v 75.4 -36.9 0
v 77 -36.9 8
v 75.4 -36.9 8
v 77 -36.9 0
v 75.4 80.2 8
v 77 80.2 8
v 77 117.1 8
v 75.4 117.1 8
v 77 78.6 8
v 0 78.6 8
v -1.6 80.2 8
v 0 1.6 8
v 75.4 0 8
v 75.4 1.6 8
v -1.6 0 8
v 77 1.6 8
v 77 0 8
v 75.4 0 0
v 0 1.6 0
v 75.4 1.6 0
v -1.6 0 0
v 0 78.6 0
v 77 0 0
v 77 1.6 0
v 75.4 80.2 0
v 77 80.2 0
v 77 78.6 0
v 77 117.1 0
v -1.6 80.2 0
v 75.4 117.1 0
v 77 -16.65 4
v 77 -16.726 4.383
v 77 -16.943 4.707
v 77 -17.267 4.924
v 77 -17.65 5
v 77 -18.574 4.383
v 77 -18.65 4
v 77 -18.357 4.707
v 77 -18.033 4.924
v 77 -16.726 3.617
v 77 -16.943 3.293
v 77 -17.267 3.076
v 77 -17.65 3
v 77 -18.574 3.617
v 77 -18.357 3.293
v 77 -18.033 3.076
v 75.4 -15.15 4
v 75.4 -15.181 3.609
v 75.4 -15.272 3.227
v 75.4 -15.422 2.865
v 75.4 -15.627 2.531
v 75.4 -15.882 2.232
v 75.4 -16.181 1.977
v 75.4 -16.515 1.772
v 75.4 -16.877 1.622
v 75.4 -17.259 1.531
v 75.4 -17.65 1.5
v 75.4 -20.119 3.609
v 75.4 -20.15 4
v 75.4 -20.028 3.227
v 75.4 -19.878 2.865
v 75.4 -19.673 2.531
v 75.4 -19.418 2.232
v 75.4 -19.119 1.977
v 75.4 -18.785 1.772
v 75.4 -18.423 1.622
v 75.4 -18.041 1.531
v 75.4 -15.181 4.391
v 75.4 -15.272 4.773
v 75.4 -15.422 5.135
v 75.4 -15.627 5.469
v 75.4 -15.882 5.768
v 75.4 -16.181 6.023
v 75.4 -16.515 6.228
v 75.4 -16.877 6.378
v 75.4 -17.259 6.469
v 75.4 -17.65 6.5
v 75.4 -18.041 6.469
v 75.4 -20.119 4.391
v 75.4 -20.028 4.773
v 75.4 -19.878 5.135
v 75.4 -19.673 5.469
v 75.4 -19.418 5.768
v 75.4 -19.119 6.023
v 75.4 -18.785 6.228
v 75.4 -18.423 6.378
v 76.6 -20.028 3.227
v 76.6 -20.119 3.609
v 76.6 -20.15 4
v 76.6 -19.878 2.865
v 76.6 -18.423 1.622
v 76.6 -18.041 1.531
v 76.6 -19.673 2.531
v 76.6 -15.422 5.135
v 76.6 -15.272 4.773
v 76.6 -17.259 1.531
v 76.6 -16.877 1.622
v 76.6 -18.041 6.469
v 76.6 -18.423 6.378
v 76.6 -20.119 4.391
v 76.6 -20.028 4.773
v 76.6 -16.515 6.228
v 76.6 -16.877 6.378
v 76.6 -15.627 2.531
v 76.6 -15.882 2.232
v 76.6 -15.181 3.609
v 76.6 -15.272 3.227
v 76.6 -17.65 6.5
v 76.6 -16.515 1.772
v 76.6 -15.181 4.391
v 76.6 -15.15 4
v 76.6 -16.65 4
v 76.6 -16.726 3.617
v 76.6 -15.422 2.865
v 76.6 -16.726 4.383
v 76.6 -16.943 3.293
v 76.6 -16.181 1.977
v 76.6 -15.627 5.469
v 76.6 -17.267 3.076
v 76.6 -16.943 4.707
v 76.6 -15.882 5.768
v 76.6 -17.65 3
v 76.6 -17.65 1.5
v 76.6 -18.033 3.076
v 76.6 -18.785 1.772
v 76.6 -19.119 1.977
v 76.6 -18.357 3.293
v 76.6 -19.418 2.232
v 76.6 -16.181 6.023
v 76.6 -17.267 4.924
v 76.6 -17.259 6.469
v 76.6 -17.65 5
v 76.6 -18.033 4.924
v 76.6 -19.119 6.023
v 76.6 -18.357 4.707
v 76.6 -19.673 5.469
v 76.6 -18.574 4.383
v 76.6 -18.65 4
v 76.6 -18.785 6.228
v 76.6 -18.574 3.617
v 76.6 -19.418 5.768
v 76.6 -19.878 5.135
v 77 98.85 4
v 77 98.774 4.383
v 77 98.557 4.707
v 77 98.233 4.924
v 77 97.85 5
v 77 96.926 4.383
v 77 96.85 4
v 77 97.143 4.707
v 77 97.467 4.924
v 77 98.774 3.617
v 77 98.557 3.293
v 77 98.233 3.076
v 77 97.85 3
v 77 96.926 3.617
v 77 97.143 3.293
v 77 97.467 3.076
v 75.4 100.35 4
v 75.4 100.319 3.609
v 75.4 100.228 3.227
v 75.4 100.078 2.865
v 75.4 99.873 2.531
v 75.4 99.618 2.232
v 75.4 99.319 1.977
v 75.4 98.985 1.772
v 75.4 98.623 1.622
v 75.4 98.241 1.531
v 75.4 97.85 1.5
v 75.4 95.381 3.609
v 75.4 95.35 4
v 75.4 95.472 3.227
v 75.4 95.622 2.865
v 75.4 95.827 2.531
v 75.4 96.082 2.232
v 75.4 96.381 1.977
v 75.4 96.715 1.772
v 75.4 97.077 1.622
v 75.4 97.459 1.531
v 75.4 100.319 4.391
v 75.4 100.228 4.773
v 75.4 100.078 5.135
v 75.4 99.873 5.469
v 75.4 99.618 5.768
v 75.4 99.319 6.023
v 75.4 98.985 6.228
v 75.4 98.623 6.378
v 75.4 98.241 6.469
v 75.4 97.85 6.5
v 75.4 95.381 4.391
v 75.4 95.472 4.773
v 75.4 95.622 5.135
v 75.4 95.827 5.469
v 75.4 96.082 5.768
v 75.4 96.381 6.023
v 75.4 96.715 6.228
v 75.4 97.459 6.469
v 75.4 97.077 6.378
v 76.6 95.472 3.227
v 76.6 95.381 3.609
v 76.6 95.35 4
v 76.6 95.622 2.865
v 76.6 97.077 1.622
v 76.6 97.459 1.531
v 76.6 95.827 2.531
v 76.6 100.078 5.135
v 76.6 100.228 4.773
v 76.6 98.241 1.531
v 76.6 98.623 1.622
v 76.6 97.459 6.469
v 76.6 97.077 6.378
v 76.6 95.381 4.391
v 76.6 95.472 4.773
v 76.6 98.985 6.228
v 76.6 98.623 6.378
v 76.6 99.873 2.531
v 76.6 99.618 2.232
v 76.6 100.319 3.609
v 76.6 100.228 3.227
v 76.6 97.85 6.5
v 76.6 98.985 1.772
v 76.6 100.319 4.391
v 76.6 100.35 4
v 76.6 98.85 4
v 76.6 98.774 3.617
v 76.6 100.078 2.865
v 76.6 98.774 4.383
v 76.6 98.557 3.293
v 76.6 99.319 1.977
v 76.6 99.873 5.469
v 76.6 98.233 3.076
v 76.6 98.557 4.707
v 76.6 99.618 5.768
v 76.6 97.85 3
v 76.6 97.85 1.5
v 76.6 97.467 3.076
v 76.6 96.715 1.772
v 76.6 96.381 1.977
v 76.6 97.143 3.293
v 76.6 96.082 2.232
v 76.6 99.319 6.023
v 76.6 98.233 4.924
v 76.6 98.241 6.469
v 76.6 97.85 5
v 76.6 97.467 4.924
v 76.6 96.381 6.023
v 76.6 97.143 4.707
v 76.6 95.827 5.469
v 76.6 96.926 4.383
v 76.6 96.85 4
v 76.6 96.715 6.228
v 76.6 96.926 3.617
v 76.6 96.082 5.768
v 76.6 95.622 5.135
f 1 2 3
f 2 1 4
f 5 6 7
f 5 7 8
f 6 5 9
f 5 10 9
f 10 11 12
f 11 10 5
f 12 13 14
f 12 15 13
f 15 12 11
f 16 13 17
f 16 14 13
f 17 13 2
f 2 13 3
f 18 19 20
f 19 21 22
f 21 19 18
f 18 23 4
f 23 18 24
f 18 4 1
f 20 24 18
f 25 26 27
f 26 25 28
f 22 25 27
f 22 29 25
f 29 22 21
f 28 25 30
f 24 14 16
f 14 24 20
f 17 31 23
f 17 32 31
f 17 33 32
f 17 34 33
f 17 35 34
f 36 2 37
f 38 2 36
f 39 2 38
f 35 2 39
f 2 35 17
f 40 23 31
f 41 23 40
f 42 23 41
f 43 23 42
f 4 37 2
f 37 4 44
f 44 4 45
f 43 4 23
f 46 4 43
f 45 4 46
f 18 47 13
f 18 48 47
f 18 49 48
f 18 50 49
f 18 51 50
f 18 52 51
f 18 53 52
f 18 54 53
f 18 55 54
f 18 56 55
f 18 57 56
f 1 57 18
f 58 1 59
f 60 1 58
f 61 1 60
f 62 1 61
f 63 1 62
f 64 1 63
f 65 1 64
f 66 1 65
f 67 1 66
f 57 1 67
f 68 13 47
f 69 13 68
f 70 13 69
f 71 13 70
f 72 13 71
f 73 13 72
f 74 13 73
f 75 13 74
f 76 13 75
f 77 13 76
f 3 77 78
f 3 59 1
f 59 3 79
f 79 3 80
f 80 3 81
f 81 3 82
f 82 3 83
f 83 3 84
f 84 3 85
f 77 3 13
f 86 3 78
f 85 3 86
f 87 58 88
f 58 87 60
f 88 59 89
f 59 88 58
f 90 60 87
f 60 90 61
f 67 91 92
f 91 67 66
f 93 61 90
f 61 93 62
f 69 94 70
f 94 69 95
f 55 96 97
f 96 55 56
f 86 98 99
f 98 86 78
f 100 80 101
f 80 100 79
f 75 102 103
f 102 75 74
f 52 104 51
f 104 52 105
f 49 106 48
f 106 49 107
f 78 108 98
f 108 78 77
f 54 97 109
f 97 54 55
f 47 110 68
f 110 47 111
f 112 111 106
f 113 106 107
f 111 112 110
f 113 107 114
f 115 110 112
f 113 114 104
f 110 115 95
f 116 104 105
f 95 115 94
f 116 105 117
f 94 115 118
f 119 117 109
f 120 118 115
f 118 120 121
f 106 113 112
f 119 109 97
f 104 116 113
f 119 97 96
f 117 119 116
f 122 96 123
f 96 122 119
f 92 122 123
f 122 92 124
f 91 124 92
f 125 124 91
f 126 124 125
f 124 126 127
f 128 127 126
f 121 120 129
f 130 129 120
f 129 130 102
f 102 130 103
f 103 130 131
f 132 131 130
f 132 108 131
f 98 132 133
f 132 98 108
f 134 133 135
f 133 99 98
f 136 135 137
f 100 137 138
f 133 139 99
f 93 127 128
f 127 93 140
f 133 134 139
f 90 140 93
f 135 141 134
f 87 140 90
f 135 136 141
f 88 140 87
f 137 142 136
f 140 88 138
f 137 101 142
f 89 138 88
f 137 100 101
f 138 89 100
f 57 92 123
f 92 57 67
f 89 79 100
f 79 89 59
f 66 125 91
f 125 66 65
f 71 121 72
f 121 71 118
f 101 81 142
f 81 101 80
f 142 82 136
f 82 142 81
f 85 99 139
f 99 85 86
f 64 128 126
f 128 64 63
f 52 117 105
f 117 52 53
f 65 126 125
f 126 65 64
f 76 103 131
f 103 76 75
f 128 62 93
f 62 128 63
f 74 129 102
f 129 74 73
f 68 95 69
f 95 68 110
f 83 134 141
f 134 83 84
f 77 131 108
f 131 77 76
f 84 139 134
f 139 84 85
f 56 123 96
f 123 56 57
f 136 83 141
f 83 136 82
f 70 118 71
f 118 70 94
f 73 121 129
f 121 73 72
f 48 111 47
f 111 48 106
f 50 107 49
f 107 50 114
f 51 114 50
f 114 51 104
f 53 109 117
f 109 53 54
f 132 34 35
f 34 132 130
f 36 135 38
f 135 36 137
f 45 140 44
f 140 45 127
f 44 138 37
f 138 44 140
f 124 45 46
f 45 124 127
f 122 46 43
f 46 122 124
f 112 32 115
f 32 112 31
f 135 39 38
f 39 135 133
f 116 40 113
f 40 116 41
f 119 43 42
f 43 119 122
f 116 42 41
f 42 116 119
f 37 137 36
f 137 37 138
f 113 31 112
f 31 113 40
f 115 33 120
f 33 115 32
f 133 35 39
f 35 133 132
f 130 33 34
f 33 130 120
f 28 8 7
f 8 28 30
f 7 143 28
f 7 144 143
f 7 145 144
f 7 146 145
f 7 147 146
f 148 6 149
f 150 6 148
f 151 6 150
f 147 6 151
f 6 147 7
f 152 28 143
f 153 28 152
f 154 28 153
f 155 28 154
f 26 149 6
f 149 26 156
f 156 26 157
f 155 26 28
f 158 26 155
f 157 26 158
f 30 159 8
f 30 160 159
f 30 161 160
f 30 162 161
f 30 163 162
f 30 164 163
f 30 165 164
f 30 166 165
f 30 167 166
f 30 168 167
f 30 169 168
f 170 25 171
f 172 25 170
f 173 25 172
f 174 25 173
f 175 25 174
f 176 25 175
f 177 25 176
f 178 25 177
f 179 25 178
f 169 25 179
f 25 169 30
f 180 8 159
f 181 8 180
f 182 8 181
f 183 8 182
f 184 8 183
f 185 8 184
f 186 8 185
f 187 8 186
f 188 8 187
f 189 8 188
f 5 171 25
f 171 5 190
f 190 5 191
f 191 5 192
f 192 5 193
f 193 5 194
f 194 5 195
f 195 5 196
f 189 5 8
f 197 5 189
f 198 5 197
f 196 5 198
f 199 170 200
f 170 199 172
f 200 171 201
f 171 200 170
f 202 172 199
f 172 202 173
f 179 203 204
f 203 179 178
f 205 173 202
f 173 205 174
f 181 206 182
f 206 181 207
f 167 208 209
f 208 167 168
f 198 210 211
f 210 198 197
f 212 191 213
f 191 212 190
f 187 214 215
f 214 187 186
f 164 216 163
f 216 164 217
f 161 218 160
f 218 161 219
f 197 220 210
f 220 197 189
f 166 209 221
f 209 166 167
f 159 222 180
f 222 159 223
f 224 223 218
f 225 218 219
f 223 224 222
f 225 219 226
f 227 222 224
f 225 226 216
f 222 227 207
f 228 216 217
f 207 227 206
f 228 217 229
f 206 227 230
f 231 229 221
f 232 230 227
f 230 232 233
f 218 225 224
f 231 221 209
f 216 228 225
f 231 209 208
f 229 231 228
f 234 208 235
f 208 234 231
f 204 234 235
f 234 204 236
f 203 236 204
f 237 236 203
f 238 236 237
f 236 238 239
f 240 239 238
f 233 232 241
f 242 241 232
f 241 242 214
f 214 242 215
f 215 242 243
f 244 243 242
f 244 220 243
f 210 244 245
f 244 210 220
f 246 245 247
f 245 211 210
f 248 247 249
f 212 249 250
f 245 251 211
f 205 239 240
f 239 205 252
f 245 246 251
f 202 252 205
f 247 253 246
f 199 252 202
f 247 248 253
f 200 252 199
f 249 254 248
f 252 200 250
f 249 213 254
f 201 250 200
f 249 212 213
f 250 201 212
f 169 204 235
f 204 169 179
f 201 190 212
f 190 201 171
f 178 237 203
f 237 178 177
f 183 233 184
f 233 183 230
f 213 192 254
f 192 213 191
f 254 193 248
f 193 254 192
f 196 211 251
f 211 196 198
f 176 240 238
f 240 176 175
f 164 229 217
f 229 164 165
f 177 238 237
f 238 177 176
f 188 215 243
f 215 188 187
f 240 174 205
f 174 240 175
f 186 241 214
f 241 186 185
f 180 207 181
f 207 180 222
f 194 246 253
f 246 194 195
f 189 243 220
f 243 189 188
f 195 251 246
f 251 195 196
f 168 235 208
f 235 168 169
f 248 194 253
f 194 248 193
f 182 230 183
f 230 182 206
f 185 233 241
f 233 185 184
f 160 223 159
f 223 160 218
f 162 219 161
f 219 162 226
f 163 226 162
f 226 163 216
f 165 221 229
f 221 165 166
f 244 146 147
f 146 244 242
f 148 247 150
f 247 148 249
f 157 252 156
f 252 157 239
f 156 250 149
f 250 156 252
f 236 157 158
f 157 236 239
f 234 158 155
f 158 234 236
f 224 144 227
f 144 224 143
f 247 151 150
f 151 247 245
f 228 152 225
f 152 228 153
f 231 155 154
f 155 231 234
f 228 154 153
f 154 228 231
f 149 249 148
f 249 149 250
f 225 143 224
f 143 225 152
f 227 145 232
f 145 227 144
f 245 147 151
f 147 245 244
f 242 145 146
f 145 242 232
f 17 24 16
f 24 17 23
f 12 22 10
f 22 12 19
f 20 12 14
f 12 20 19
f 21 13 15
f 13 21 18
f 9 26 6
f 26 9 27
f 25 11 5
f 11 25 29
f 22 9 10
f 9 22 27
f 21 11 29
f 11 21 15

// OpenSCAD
$fa=1;
$fs=0.4;

// cube electrical plug
side_width = 77;
thickness = 1.6; //wall width 0.8 * 2
holder_width = 8;
top_plate_length = side_width/2;

module side (
    side_width=side_width) {
    cube([side_width, thickness, holder_width]);
}


// right side
translate([0,0,0])
    rotate([0,0,0])
        side();

// left side
translate([0, side_width+thickness, 0])
    rotate([0,0,0])
        side();

// bottom side
//translate([0, side_width+thickness, 0])
    rotate([0,0,90])
        side(side_width = side_width + thickness *2 );



module top_plate() {
    difference() {
        side(side_width = top_plate_length );
        translate([top_plate_length/2,-thickness/2,holder_width/2])        
            rotate([-90,0,0]) 
                cylinder(h=2,r=2.5);
        translate([top_plate_length/2,-1,holder_width/2])        
            rotate([-90,0,0]) 
                cylinder(h=thickness+2,r=1);
    }
}

// right top plate
translate([side_width-thickness, thickness, 0])
    rotate([0,0,-90])
        top_plate();

// left top plate
translate([side_width-thickness, side_width + thickness + top_plate_length, 0])
    rotate([0,0,-90])
        top_plate();
